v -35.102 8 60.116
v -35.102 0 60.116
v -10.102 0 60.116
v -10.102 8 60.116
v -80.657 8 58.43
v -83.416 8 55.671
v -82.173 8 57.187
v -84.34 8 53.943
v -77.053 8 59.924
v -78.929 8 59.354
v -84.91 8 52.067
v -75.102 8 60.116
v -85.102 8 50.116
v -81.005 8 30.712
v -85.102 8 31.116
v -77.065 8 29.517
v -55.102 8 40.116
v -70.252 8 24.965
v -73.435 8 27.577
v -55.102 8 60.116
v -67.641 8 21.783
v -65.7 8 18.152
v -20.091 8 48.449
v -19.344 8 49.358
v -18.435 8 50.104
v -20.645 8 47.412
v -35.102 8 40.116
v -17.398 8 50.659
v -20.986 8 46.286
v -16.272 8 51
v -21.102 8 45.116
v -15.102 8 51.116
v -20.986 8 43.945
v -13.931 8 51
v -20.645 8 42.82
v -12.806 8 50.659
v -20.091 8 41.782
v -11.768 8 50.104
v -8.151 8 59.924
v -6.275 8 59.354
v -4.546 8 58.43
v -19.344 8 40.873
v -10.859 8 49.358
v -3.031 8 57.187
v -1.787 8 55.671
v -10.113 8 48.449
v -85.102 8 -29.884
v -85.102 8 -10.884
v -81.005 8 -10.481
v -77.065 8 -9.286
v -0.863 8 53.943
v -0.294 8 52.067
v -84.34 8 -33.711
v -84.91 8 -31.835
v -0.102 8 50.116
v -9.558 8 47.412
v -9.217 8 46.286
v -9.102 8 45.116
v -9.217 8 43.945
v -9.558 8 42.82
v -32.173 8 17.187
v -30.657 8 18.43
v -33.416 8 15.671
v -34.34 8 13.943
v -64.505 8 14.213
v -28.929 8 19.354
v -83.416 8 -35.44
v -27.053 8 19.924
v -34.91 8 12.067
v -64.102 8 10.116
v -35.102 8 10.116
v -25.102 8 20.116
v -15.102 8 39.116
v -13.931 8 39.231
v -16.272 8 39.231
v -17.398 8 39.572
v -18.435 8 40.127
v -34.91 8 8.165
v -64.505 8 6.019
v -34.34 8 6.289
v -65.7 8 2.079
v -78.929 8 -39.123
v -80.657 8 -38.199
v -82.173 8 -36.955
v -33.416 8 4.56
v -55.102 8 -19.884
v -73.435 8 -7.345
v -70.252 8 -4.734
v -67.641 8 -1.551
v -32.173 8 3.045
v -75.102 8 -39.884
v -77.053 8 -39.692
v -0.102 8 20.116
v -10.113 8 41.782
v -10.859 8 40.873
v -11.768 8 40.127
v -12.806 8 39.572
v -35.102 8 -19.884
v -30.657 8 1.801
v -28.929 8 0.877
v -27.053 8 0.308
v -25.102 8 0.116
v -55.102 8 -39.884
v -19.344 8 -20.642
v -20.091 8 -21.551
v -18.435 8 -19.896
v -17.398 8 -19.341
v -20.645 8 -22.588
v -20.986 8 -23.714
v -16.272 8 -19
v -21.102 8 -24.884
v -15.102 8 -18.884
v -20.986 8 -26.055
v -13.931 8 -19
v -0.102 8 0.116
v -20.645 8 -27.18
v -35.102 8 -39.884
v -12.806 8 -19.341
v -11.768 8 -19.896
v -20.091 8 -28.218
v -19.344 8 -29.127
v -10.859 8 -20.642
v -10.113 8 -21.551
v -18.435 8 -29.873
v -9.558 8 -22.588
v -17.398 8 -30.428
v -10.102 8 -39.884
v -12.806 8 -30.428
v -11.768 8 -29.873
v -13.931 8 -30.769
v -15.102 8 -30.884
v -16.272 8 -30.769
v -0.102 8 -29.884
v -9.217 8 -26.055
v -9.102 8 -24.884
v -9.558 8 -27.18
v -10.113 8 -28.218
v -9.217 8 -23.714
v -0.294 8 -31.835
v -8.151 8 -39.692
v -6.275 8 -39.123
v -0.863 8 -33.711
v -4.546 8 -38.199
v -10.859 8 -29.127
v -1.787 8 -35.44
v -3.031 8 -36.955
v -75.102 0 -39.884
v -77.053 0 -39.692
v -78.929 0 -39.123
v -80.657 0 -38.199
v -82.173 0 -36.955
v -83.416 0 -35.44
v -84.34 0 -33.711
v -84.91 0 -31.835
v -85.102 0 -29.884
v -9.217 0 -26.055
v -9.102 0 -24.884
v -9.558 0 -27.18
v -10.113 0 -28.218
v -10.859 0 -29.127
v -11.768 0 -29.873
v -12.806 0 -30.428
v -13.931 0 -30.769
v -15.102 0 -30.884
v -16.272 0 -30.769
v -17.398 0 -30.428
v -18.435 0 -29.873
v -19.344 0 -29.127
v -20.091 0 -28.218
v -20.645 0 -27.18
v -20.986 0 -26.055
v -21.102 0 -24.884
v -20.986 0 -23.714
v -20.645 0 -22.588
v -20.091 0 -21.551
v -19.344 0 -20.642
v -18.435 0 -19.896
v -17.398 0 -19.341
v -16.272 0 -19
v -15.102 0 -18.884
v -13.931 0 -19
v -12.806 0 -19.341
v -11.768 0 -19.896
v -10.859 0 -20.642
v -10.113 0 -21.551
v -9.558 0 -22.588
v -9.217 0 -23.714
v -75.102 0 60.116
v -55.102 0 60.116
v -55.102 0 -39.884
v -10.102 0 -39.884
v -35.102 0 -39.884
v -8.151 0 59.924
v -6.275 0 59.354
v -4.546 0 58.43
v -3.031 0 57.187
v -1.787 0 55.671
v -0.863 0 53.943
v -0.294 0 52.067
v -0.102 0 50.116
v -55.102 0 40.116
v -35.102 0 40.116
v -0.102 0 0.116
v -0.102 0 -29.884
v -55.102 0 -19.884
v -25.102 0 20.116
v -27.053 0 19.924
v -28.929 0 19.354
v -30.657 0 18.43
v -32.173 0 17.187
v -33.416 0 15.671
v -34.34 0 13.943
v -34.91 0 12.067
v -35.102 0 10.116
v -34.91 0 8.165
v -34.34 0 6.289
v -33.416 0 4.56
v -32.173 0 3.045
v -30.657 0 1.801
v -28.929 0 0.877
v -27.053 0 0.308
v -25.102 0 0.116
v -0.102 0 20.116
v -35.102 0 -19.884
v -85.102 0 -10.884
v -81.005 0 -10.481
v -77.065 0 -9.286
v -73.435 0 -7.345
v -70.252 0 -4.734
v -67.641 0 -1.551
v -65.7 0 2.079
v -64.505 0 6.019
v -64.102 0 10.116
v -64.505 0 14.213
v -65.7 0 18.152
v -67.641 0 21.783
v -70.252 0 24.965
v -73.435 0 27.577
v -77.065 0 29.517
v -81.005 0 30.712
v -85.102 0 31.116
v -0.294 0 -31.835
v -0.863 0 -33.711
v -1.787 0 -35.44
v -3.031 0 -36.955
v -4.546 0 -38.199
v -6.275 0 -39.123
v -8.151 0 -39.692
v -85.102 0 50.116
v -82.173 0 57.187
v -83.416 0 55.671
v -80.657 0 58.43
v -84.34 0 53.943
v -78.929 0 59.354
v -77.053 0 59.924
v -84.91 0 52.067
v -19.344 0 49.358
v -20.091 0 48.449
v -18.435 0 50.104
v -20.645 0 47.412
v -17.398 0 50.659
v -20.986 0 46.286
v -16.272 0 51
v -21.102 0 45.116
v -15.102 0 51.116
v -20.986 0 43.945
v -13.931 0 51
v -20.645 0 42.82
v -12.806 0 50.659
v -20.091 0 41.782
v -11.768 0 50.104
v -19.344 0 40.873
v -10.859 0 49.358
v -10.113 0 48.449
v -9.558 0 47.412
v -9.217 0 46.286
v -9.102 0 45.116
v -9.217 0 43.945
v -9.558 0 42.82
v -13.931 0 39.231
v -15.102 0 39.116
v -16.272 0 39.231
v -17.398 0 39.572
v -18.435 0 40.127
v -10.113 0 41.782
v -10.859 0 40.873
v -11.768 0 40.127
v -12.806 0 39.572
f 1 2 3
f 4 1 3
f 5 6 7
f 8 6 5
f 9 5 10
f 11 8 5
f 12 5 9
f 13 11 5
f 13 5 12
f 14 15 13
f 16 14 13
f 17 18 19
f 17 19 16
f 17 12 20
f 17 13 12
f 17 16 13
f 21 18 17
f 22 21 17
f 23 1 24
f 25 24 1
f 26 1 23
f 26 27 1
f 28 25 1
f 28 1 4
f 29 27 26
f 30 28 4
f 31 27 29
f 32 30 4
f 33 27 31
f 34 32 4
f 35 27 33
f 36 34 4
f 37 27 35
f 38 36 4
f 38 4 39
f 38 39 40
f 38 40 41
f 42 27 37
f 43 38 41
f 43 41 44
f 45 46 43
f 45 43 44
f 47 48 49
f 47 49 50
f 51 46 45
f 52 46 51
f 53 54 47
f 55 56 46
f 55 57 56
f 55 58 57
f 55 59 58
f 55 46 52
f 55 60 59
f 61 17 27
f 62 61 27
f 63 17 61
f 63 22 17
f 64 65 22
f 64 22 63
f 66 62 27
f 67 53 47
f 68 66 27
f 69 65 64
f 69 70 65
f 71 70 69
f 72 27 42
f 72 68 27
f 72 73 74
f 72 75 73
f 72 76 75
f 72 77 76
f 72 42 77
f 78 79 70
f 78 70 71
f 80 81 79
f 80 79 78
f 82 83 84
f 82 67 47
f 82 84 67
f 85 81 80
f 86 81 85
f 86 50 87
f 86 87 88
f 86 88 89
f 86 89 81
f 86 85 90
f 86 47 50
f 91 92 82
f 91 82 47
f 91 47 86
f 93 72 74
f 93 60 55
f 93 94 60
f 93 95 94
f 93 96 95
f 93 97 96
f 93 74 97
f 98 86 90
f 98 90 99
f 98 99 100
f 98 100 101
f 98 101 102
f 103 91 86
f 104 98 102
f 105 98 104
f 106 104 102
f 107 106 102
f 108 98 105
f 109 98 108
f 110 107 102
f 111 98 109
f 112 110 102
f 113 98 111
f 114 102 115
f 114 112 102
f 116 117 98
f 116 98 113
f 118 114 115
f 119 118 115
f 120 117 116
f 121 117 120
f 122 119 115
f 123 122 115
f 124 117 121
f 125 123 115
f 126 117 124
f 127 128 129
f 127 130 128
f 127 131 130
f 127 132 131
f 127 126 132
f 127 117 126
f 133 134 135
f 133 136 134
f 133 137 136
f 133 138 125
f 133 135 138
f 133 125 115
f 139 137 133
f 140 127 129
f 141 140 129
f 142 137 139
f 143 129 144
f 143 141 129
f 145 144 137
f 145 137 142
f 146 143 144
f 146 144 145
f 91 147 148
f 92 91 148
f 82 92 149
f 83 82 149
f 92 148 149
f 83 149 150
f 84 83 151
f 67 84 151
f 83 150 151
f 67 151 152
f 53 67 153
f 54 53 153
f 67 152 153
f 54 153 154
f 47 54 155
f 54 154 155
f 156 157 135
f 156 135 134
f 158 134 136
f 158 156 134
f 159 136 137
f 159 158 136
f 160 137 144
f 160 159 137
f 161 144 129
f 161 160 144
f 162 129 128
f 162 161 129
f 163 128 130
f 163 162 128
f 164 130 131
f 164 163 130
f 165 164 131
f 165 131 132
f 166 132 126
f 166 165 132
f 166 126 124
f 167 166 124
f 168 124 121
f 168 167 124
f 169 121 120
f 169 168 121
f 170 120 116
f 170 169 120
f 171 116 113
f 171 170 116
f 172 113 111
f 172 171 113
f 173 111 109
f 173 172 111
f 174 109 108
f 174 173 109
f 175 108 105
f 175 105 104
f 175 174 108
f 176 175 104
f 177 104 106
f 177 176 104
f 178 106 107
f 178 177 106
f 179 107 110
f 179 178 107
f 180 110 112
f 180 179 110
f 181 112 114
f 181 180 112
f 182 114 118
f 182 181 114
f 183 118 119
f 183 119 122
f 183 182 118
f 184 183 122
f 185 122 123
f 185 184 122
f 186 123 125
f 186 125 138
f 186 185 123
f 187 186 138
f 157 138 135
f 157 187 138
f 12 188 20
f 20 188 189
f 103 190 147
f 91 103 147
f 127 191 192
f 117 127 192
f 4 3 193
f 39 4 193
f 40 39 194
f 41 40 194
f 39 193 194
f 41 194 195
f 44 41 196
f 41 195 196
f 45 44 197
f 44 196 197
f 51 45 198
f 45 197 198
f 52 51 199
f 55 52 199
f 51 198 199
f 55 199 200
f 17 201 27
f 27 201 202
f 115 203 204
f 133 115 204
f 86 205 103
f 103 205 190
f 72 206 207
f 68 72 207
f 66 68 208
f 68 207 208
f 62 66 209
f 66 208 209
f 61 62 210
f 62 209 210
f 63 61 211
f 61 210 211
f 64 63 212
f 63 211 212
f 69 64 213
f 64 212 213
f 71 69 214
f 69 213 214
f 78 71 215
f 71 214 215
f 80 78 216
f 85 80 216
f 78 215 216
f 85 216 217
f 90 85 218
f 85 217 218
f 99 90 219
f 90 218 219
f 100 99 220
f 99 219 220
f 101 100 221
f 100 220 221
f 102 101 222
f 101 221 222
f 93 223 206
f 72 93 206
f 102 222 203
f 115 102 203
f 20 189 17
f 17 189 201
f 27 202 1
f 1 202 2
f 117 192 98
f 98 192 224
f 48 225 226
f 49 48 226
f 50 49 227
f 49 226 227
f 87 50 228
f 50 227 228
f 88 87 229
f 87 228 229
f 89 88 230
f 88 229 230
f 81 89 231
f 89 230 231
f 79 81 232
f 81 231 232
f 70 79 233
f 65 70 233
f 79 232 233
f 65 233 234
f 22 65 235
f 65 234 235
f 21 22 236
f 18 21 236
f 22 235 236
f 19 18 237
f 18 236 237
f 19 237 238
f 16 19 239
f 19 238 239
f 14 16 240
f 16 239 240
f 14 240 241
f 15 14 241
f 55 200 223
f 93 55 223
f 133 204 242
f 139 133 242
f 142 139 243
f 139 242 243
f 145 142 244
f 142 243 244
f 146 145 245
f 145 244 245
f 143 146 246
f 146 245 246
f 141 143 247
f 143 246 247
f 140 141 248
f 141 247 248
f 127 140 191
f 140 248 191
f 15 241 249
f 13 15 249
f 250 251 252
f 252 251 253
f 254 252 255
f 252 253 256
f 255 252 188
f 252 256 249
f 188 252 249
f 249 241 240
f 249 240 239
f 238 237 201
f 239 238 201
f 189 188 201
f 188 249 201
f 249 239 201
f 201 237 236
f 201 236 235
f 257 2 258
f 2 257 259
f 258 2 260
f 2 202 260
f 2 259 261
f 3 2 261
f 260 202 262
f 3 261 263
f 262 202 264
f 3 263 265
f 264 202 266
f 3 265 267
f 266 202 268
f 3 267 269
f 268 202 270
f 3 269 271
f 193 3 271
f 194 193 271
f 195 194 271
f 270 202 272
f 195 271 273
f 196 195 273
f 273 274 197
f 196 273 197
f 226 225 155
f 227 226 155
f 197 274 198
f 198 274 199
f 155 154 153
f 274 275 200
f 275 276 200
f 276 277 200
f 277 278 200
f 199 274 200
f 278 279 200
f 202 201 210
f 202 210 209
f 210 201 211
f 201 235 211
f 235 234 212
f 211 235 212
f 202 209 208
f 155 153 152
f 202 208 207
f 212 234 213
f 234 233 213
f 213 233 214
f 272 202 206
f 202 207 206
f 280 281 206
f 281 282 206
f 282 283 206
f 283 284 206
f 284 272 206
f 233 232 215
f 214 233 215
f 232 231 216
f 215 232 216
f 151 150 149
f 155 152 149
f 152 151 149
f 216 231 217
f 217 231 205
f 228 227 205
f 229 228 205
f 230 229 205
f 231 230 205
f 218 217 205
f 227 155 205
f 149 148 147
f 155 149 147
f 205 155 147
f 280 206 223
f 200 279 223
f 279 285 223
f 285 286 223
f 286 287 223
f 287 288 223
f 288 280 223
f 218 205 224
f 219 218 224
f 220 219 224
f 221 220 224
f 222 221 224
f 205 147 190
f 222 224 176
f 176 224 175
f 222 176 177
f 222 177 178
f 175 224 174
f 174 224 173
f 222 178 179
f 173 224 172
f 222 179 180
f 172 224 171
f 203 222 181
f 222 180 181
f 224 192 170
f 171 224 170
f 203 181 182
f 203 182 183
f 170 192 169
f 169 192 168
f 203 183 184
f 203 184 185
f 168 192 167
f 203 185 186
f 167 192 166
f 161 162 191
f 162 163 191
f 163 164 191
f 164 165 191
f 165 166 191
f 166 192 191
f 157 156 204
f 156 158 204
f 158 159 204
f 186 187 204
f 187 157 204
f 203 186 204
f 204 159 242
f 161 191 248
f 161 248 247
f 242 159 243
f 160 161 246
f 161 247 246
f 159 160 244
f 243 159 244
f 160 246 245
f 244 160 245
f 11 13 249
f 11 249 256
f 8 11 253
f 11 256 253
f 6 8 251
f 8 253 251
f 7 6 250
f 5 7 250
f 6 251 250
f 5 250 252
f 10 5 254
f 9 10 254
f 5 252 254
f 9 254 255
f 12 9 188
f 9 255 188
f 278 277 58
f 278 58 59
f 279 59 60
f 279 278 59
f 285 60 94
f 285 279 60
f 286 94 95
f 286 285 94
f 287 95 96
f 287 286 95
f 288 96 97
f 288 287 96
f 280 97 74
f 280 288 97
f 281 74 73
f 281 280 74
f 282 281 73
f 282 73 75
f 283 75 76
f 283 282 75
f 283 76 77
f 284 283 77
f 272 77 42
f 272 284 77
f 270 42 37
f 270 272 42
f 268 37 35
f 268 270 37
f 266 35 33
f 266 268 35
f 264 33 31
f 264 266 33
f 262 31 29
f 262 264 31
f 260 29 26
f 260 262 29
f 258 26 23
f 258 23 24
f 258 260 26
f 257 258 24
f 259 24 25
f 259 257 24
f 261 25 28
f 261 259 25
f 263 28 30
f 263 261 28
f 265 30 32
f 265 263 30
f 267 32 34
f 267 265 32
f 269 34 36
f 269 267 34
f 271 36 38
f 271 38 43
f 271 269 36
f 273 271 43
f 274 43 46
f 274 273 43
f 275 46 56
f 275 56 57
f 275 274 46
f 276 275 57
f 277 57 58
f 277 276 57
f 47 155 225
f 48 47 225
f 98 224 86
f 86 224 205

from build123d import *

# Parameters (mm, degrees)
SKETCH1_R           = 6
BOSS_EXTRUDE1_DEPTH = 8


with BuildPart() as part:
    # Sketch1 → Boss-Extrude1 (new body)
    with BuildSketch(Plane(origin=(0, 0, 0), x_dir=(1, 0, 0), z_dir=(0, 1, 0))):
        with BuildLine():
            Line((-25.10169054, -0.115674765), (-0.10169054, -0.115674765))
            Line((-0.10169054, -0.115674765), (-0.10169054, 29.884325235))
            ThreePointArc((-0.10169054, 29.884325235), (-3.030622728, 36.955393047), (-10.10169054, 39.884325235))
            Line((-10.10169054, 39.884325235), (-35.10169054, 39.884325235))
            Line((-35.10169054, 39.884325235), (-35.10169054, 19.884325235))
            Line((-35.10169054, 19.884325235), (-55.10169054, 19.884325235))
            Line((-55.10169054, 19.884325235), (-55.10169054, 39.884325235))
            Line((-55.10169054, 39.884325235), (-75.10169054, 39.884325235))
            ThreePointArc((-75.10169054, 39.884325235), (-82.172758352, 36.955393047), (-85.10169054, 29.884325235))
            Line((-85.10169054, 29.884325235), (-85.10169054, 10.884325235))
            ThreePointArc((-85.10169054, 10.884325235), (-64.10169054, -10.115674765), (-85.10169054, -31.115674765))
            Line((-85.10169054, -31.115674765), (-85.10169054, -50.115674765))
            ThreePointArc((-85.10169054, -50.115674765), (-82.172758352, -57.186742577), (-75.10169054, -60.115674765))
            Line((-75.10169054, -60.115674765), (-55.10169054, -60.115674765))
            Line((-55.10169054, -60.115674765), (-55.10169054, -40.115674765))
            Line((-55.10169054, -40.115674765), (-35.10169054, -40.115674765))
            Line((-35.10169054, -40.115674765), (-35.10169054, -60.115674765))
            Line((-35.10169054, -60.115674765), (-10.10169054, -60.115674765))
            ThreePointArc((-10.10169054, -60.115674765), (-3.030622728, -57.186742577), (-0.10169054, -50.115674765))
            Line((-0.10169054, -50.115674765), (-0.10169054, -20.115674765))
            Line((-0.10169054, -20.115674765), (-25.10169054, -20.115674765))
            ThreePointArc((-25.10169054, -20.115674765), (-35.10169054, -10.115674765), (-25.10169054, -0.115674765))
        make_face()
        with Locations((-15.10169054, 24.884325235)):
            Circle(SKETCH1_R, mode=Mode.SUBTRACT)
        with Locations((-15.10169054, -45.115674765)):
            Circle(SKETCH1_R, mode=Mode.SUBTRACT)
    extrude(amount=BOSS_EXTRUDE1_DEPTH)


solid = part.part
